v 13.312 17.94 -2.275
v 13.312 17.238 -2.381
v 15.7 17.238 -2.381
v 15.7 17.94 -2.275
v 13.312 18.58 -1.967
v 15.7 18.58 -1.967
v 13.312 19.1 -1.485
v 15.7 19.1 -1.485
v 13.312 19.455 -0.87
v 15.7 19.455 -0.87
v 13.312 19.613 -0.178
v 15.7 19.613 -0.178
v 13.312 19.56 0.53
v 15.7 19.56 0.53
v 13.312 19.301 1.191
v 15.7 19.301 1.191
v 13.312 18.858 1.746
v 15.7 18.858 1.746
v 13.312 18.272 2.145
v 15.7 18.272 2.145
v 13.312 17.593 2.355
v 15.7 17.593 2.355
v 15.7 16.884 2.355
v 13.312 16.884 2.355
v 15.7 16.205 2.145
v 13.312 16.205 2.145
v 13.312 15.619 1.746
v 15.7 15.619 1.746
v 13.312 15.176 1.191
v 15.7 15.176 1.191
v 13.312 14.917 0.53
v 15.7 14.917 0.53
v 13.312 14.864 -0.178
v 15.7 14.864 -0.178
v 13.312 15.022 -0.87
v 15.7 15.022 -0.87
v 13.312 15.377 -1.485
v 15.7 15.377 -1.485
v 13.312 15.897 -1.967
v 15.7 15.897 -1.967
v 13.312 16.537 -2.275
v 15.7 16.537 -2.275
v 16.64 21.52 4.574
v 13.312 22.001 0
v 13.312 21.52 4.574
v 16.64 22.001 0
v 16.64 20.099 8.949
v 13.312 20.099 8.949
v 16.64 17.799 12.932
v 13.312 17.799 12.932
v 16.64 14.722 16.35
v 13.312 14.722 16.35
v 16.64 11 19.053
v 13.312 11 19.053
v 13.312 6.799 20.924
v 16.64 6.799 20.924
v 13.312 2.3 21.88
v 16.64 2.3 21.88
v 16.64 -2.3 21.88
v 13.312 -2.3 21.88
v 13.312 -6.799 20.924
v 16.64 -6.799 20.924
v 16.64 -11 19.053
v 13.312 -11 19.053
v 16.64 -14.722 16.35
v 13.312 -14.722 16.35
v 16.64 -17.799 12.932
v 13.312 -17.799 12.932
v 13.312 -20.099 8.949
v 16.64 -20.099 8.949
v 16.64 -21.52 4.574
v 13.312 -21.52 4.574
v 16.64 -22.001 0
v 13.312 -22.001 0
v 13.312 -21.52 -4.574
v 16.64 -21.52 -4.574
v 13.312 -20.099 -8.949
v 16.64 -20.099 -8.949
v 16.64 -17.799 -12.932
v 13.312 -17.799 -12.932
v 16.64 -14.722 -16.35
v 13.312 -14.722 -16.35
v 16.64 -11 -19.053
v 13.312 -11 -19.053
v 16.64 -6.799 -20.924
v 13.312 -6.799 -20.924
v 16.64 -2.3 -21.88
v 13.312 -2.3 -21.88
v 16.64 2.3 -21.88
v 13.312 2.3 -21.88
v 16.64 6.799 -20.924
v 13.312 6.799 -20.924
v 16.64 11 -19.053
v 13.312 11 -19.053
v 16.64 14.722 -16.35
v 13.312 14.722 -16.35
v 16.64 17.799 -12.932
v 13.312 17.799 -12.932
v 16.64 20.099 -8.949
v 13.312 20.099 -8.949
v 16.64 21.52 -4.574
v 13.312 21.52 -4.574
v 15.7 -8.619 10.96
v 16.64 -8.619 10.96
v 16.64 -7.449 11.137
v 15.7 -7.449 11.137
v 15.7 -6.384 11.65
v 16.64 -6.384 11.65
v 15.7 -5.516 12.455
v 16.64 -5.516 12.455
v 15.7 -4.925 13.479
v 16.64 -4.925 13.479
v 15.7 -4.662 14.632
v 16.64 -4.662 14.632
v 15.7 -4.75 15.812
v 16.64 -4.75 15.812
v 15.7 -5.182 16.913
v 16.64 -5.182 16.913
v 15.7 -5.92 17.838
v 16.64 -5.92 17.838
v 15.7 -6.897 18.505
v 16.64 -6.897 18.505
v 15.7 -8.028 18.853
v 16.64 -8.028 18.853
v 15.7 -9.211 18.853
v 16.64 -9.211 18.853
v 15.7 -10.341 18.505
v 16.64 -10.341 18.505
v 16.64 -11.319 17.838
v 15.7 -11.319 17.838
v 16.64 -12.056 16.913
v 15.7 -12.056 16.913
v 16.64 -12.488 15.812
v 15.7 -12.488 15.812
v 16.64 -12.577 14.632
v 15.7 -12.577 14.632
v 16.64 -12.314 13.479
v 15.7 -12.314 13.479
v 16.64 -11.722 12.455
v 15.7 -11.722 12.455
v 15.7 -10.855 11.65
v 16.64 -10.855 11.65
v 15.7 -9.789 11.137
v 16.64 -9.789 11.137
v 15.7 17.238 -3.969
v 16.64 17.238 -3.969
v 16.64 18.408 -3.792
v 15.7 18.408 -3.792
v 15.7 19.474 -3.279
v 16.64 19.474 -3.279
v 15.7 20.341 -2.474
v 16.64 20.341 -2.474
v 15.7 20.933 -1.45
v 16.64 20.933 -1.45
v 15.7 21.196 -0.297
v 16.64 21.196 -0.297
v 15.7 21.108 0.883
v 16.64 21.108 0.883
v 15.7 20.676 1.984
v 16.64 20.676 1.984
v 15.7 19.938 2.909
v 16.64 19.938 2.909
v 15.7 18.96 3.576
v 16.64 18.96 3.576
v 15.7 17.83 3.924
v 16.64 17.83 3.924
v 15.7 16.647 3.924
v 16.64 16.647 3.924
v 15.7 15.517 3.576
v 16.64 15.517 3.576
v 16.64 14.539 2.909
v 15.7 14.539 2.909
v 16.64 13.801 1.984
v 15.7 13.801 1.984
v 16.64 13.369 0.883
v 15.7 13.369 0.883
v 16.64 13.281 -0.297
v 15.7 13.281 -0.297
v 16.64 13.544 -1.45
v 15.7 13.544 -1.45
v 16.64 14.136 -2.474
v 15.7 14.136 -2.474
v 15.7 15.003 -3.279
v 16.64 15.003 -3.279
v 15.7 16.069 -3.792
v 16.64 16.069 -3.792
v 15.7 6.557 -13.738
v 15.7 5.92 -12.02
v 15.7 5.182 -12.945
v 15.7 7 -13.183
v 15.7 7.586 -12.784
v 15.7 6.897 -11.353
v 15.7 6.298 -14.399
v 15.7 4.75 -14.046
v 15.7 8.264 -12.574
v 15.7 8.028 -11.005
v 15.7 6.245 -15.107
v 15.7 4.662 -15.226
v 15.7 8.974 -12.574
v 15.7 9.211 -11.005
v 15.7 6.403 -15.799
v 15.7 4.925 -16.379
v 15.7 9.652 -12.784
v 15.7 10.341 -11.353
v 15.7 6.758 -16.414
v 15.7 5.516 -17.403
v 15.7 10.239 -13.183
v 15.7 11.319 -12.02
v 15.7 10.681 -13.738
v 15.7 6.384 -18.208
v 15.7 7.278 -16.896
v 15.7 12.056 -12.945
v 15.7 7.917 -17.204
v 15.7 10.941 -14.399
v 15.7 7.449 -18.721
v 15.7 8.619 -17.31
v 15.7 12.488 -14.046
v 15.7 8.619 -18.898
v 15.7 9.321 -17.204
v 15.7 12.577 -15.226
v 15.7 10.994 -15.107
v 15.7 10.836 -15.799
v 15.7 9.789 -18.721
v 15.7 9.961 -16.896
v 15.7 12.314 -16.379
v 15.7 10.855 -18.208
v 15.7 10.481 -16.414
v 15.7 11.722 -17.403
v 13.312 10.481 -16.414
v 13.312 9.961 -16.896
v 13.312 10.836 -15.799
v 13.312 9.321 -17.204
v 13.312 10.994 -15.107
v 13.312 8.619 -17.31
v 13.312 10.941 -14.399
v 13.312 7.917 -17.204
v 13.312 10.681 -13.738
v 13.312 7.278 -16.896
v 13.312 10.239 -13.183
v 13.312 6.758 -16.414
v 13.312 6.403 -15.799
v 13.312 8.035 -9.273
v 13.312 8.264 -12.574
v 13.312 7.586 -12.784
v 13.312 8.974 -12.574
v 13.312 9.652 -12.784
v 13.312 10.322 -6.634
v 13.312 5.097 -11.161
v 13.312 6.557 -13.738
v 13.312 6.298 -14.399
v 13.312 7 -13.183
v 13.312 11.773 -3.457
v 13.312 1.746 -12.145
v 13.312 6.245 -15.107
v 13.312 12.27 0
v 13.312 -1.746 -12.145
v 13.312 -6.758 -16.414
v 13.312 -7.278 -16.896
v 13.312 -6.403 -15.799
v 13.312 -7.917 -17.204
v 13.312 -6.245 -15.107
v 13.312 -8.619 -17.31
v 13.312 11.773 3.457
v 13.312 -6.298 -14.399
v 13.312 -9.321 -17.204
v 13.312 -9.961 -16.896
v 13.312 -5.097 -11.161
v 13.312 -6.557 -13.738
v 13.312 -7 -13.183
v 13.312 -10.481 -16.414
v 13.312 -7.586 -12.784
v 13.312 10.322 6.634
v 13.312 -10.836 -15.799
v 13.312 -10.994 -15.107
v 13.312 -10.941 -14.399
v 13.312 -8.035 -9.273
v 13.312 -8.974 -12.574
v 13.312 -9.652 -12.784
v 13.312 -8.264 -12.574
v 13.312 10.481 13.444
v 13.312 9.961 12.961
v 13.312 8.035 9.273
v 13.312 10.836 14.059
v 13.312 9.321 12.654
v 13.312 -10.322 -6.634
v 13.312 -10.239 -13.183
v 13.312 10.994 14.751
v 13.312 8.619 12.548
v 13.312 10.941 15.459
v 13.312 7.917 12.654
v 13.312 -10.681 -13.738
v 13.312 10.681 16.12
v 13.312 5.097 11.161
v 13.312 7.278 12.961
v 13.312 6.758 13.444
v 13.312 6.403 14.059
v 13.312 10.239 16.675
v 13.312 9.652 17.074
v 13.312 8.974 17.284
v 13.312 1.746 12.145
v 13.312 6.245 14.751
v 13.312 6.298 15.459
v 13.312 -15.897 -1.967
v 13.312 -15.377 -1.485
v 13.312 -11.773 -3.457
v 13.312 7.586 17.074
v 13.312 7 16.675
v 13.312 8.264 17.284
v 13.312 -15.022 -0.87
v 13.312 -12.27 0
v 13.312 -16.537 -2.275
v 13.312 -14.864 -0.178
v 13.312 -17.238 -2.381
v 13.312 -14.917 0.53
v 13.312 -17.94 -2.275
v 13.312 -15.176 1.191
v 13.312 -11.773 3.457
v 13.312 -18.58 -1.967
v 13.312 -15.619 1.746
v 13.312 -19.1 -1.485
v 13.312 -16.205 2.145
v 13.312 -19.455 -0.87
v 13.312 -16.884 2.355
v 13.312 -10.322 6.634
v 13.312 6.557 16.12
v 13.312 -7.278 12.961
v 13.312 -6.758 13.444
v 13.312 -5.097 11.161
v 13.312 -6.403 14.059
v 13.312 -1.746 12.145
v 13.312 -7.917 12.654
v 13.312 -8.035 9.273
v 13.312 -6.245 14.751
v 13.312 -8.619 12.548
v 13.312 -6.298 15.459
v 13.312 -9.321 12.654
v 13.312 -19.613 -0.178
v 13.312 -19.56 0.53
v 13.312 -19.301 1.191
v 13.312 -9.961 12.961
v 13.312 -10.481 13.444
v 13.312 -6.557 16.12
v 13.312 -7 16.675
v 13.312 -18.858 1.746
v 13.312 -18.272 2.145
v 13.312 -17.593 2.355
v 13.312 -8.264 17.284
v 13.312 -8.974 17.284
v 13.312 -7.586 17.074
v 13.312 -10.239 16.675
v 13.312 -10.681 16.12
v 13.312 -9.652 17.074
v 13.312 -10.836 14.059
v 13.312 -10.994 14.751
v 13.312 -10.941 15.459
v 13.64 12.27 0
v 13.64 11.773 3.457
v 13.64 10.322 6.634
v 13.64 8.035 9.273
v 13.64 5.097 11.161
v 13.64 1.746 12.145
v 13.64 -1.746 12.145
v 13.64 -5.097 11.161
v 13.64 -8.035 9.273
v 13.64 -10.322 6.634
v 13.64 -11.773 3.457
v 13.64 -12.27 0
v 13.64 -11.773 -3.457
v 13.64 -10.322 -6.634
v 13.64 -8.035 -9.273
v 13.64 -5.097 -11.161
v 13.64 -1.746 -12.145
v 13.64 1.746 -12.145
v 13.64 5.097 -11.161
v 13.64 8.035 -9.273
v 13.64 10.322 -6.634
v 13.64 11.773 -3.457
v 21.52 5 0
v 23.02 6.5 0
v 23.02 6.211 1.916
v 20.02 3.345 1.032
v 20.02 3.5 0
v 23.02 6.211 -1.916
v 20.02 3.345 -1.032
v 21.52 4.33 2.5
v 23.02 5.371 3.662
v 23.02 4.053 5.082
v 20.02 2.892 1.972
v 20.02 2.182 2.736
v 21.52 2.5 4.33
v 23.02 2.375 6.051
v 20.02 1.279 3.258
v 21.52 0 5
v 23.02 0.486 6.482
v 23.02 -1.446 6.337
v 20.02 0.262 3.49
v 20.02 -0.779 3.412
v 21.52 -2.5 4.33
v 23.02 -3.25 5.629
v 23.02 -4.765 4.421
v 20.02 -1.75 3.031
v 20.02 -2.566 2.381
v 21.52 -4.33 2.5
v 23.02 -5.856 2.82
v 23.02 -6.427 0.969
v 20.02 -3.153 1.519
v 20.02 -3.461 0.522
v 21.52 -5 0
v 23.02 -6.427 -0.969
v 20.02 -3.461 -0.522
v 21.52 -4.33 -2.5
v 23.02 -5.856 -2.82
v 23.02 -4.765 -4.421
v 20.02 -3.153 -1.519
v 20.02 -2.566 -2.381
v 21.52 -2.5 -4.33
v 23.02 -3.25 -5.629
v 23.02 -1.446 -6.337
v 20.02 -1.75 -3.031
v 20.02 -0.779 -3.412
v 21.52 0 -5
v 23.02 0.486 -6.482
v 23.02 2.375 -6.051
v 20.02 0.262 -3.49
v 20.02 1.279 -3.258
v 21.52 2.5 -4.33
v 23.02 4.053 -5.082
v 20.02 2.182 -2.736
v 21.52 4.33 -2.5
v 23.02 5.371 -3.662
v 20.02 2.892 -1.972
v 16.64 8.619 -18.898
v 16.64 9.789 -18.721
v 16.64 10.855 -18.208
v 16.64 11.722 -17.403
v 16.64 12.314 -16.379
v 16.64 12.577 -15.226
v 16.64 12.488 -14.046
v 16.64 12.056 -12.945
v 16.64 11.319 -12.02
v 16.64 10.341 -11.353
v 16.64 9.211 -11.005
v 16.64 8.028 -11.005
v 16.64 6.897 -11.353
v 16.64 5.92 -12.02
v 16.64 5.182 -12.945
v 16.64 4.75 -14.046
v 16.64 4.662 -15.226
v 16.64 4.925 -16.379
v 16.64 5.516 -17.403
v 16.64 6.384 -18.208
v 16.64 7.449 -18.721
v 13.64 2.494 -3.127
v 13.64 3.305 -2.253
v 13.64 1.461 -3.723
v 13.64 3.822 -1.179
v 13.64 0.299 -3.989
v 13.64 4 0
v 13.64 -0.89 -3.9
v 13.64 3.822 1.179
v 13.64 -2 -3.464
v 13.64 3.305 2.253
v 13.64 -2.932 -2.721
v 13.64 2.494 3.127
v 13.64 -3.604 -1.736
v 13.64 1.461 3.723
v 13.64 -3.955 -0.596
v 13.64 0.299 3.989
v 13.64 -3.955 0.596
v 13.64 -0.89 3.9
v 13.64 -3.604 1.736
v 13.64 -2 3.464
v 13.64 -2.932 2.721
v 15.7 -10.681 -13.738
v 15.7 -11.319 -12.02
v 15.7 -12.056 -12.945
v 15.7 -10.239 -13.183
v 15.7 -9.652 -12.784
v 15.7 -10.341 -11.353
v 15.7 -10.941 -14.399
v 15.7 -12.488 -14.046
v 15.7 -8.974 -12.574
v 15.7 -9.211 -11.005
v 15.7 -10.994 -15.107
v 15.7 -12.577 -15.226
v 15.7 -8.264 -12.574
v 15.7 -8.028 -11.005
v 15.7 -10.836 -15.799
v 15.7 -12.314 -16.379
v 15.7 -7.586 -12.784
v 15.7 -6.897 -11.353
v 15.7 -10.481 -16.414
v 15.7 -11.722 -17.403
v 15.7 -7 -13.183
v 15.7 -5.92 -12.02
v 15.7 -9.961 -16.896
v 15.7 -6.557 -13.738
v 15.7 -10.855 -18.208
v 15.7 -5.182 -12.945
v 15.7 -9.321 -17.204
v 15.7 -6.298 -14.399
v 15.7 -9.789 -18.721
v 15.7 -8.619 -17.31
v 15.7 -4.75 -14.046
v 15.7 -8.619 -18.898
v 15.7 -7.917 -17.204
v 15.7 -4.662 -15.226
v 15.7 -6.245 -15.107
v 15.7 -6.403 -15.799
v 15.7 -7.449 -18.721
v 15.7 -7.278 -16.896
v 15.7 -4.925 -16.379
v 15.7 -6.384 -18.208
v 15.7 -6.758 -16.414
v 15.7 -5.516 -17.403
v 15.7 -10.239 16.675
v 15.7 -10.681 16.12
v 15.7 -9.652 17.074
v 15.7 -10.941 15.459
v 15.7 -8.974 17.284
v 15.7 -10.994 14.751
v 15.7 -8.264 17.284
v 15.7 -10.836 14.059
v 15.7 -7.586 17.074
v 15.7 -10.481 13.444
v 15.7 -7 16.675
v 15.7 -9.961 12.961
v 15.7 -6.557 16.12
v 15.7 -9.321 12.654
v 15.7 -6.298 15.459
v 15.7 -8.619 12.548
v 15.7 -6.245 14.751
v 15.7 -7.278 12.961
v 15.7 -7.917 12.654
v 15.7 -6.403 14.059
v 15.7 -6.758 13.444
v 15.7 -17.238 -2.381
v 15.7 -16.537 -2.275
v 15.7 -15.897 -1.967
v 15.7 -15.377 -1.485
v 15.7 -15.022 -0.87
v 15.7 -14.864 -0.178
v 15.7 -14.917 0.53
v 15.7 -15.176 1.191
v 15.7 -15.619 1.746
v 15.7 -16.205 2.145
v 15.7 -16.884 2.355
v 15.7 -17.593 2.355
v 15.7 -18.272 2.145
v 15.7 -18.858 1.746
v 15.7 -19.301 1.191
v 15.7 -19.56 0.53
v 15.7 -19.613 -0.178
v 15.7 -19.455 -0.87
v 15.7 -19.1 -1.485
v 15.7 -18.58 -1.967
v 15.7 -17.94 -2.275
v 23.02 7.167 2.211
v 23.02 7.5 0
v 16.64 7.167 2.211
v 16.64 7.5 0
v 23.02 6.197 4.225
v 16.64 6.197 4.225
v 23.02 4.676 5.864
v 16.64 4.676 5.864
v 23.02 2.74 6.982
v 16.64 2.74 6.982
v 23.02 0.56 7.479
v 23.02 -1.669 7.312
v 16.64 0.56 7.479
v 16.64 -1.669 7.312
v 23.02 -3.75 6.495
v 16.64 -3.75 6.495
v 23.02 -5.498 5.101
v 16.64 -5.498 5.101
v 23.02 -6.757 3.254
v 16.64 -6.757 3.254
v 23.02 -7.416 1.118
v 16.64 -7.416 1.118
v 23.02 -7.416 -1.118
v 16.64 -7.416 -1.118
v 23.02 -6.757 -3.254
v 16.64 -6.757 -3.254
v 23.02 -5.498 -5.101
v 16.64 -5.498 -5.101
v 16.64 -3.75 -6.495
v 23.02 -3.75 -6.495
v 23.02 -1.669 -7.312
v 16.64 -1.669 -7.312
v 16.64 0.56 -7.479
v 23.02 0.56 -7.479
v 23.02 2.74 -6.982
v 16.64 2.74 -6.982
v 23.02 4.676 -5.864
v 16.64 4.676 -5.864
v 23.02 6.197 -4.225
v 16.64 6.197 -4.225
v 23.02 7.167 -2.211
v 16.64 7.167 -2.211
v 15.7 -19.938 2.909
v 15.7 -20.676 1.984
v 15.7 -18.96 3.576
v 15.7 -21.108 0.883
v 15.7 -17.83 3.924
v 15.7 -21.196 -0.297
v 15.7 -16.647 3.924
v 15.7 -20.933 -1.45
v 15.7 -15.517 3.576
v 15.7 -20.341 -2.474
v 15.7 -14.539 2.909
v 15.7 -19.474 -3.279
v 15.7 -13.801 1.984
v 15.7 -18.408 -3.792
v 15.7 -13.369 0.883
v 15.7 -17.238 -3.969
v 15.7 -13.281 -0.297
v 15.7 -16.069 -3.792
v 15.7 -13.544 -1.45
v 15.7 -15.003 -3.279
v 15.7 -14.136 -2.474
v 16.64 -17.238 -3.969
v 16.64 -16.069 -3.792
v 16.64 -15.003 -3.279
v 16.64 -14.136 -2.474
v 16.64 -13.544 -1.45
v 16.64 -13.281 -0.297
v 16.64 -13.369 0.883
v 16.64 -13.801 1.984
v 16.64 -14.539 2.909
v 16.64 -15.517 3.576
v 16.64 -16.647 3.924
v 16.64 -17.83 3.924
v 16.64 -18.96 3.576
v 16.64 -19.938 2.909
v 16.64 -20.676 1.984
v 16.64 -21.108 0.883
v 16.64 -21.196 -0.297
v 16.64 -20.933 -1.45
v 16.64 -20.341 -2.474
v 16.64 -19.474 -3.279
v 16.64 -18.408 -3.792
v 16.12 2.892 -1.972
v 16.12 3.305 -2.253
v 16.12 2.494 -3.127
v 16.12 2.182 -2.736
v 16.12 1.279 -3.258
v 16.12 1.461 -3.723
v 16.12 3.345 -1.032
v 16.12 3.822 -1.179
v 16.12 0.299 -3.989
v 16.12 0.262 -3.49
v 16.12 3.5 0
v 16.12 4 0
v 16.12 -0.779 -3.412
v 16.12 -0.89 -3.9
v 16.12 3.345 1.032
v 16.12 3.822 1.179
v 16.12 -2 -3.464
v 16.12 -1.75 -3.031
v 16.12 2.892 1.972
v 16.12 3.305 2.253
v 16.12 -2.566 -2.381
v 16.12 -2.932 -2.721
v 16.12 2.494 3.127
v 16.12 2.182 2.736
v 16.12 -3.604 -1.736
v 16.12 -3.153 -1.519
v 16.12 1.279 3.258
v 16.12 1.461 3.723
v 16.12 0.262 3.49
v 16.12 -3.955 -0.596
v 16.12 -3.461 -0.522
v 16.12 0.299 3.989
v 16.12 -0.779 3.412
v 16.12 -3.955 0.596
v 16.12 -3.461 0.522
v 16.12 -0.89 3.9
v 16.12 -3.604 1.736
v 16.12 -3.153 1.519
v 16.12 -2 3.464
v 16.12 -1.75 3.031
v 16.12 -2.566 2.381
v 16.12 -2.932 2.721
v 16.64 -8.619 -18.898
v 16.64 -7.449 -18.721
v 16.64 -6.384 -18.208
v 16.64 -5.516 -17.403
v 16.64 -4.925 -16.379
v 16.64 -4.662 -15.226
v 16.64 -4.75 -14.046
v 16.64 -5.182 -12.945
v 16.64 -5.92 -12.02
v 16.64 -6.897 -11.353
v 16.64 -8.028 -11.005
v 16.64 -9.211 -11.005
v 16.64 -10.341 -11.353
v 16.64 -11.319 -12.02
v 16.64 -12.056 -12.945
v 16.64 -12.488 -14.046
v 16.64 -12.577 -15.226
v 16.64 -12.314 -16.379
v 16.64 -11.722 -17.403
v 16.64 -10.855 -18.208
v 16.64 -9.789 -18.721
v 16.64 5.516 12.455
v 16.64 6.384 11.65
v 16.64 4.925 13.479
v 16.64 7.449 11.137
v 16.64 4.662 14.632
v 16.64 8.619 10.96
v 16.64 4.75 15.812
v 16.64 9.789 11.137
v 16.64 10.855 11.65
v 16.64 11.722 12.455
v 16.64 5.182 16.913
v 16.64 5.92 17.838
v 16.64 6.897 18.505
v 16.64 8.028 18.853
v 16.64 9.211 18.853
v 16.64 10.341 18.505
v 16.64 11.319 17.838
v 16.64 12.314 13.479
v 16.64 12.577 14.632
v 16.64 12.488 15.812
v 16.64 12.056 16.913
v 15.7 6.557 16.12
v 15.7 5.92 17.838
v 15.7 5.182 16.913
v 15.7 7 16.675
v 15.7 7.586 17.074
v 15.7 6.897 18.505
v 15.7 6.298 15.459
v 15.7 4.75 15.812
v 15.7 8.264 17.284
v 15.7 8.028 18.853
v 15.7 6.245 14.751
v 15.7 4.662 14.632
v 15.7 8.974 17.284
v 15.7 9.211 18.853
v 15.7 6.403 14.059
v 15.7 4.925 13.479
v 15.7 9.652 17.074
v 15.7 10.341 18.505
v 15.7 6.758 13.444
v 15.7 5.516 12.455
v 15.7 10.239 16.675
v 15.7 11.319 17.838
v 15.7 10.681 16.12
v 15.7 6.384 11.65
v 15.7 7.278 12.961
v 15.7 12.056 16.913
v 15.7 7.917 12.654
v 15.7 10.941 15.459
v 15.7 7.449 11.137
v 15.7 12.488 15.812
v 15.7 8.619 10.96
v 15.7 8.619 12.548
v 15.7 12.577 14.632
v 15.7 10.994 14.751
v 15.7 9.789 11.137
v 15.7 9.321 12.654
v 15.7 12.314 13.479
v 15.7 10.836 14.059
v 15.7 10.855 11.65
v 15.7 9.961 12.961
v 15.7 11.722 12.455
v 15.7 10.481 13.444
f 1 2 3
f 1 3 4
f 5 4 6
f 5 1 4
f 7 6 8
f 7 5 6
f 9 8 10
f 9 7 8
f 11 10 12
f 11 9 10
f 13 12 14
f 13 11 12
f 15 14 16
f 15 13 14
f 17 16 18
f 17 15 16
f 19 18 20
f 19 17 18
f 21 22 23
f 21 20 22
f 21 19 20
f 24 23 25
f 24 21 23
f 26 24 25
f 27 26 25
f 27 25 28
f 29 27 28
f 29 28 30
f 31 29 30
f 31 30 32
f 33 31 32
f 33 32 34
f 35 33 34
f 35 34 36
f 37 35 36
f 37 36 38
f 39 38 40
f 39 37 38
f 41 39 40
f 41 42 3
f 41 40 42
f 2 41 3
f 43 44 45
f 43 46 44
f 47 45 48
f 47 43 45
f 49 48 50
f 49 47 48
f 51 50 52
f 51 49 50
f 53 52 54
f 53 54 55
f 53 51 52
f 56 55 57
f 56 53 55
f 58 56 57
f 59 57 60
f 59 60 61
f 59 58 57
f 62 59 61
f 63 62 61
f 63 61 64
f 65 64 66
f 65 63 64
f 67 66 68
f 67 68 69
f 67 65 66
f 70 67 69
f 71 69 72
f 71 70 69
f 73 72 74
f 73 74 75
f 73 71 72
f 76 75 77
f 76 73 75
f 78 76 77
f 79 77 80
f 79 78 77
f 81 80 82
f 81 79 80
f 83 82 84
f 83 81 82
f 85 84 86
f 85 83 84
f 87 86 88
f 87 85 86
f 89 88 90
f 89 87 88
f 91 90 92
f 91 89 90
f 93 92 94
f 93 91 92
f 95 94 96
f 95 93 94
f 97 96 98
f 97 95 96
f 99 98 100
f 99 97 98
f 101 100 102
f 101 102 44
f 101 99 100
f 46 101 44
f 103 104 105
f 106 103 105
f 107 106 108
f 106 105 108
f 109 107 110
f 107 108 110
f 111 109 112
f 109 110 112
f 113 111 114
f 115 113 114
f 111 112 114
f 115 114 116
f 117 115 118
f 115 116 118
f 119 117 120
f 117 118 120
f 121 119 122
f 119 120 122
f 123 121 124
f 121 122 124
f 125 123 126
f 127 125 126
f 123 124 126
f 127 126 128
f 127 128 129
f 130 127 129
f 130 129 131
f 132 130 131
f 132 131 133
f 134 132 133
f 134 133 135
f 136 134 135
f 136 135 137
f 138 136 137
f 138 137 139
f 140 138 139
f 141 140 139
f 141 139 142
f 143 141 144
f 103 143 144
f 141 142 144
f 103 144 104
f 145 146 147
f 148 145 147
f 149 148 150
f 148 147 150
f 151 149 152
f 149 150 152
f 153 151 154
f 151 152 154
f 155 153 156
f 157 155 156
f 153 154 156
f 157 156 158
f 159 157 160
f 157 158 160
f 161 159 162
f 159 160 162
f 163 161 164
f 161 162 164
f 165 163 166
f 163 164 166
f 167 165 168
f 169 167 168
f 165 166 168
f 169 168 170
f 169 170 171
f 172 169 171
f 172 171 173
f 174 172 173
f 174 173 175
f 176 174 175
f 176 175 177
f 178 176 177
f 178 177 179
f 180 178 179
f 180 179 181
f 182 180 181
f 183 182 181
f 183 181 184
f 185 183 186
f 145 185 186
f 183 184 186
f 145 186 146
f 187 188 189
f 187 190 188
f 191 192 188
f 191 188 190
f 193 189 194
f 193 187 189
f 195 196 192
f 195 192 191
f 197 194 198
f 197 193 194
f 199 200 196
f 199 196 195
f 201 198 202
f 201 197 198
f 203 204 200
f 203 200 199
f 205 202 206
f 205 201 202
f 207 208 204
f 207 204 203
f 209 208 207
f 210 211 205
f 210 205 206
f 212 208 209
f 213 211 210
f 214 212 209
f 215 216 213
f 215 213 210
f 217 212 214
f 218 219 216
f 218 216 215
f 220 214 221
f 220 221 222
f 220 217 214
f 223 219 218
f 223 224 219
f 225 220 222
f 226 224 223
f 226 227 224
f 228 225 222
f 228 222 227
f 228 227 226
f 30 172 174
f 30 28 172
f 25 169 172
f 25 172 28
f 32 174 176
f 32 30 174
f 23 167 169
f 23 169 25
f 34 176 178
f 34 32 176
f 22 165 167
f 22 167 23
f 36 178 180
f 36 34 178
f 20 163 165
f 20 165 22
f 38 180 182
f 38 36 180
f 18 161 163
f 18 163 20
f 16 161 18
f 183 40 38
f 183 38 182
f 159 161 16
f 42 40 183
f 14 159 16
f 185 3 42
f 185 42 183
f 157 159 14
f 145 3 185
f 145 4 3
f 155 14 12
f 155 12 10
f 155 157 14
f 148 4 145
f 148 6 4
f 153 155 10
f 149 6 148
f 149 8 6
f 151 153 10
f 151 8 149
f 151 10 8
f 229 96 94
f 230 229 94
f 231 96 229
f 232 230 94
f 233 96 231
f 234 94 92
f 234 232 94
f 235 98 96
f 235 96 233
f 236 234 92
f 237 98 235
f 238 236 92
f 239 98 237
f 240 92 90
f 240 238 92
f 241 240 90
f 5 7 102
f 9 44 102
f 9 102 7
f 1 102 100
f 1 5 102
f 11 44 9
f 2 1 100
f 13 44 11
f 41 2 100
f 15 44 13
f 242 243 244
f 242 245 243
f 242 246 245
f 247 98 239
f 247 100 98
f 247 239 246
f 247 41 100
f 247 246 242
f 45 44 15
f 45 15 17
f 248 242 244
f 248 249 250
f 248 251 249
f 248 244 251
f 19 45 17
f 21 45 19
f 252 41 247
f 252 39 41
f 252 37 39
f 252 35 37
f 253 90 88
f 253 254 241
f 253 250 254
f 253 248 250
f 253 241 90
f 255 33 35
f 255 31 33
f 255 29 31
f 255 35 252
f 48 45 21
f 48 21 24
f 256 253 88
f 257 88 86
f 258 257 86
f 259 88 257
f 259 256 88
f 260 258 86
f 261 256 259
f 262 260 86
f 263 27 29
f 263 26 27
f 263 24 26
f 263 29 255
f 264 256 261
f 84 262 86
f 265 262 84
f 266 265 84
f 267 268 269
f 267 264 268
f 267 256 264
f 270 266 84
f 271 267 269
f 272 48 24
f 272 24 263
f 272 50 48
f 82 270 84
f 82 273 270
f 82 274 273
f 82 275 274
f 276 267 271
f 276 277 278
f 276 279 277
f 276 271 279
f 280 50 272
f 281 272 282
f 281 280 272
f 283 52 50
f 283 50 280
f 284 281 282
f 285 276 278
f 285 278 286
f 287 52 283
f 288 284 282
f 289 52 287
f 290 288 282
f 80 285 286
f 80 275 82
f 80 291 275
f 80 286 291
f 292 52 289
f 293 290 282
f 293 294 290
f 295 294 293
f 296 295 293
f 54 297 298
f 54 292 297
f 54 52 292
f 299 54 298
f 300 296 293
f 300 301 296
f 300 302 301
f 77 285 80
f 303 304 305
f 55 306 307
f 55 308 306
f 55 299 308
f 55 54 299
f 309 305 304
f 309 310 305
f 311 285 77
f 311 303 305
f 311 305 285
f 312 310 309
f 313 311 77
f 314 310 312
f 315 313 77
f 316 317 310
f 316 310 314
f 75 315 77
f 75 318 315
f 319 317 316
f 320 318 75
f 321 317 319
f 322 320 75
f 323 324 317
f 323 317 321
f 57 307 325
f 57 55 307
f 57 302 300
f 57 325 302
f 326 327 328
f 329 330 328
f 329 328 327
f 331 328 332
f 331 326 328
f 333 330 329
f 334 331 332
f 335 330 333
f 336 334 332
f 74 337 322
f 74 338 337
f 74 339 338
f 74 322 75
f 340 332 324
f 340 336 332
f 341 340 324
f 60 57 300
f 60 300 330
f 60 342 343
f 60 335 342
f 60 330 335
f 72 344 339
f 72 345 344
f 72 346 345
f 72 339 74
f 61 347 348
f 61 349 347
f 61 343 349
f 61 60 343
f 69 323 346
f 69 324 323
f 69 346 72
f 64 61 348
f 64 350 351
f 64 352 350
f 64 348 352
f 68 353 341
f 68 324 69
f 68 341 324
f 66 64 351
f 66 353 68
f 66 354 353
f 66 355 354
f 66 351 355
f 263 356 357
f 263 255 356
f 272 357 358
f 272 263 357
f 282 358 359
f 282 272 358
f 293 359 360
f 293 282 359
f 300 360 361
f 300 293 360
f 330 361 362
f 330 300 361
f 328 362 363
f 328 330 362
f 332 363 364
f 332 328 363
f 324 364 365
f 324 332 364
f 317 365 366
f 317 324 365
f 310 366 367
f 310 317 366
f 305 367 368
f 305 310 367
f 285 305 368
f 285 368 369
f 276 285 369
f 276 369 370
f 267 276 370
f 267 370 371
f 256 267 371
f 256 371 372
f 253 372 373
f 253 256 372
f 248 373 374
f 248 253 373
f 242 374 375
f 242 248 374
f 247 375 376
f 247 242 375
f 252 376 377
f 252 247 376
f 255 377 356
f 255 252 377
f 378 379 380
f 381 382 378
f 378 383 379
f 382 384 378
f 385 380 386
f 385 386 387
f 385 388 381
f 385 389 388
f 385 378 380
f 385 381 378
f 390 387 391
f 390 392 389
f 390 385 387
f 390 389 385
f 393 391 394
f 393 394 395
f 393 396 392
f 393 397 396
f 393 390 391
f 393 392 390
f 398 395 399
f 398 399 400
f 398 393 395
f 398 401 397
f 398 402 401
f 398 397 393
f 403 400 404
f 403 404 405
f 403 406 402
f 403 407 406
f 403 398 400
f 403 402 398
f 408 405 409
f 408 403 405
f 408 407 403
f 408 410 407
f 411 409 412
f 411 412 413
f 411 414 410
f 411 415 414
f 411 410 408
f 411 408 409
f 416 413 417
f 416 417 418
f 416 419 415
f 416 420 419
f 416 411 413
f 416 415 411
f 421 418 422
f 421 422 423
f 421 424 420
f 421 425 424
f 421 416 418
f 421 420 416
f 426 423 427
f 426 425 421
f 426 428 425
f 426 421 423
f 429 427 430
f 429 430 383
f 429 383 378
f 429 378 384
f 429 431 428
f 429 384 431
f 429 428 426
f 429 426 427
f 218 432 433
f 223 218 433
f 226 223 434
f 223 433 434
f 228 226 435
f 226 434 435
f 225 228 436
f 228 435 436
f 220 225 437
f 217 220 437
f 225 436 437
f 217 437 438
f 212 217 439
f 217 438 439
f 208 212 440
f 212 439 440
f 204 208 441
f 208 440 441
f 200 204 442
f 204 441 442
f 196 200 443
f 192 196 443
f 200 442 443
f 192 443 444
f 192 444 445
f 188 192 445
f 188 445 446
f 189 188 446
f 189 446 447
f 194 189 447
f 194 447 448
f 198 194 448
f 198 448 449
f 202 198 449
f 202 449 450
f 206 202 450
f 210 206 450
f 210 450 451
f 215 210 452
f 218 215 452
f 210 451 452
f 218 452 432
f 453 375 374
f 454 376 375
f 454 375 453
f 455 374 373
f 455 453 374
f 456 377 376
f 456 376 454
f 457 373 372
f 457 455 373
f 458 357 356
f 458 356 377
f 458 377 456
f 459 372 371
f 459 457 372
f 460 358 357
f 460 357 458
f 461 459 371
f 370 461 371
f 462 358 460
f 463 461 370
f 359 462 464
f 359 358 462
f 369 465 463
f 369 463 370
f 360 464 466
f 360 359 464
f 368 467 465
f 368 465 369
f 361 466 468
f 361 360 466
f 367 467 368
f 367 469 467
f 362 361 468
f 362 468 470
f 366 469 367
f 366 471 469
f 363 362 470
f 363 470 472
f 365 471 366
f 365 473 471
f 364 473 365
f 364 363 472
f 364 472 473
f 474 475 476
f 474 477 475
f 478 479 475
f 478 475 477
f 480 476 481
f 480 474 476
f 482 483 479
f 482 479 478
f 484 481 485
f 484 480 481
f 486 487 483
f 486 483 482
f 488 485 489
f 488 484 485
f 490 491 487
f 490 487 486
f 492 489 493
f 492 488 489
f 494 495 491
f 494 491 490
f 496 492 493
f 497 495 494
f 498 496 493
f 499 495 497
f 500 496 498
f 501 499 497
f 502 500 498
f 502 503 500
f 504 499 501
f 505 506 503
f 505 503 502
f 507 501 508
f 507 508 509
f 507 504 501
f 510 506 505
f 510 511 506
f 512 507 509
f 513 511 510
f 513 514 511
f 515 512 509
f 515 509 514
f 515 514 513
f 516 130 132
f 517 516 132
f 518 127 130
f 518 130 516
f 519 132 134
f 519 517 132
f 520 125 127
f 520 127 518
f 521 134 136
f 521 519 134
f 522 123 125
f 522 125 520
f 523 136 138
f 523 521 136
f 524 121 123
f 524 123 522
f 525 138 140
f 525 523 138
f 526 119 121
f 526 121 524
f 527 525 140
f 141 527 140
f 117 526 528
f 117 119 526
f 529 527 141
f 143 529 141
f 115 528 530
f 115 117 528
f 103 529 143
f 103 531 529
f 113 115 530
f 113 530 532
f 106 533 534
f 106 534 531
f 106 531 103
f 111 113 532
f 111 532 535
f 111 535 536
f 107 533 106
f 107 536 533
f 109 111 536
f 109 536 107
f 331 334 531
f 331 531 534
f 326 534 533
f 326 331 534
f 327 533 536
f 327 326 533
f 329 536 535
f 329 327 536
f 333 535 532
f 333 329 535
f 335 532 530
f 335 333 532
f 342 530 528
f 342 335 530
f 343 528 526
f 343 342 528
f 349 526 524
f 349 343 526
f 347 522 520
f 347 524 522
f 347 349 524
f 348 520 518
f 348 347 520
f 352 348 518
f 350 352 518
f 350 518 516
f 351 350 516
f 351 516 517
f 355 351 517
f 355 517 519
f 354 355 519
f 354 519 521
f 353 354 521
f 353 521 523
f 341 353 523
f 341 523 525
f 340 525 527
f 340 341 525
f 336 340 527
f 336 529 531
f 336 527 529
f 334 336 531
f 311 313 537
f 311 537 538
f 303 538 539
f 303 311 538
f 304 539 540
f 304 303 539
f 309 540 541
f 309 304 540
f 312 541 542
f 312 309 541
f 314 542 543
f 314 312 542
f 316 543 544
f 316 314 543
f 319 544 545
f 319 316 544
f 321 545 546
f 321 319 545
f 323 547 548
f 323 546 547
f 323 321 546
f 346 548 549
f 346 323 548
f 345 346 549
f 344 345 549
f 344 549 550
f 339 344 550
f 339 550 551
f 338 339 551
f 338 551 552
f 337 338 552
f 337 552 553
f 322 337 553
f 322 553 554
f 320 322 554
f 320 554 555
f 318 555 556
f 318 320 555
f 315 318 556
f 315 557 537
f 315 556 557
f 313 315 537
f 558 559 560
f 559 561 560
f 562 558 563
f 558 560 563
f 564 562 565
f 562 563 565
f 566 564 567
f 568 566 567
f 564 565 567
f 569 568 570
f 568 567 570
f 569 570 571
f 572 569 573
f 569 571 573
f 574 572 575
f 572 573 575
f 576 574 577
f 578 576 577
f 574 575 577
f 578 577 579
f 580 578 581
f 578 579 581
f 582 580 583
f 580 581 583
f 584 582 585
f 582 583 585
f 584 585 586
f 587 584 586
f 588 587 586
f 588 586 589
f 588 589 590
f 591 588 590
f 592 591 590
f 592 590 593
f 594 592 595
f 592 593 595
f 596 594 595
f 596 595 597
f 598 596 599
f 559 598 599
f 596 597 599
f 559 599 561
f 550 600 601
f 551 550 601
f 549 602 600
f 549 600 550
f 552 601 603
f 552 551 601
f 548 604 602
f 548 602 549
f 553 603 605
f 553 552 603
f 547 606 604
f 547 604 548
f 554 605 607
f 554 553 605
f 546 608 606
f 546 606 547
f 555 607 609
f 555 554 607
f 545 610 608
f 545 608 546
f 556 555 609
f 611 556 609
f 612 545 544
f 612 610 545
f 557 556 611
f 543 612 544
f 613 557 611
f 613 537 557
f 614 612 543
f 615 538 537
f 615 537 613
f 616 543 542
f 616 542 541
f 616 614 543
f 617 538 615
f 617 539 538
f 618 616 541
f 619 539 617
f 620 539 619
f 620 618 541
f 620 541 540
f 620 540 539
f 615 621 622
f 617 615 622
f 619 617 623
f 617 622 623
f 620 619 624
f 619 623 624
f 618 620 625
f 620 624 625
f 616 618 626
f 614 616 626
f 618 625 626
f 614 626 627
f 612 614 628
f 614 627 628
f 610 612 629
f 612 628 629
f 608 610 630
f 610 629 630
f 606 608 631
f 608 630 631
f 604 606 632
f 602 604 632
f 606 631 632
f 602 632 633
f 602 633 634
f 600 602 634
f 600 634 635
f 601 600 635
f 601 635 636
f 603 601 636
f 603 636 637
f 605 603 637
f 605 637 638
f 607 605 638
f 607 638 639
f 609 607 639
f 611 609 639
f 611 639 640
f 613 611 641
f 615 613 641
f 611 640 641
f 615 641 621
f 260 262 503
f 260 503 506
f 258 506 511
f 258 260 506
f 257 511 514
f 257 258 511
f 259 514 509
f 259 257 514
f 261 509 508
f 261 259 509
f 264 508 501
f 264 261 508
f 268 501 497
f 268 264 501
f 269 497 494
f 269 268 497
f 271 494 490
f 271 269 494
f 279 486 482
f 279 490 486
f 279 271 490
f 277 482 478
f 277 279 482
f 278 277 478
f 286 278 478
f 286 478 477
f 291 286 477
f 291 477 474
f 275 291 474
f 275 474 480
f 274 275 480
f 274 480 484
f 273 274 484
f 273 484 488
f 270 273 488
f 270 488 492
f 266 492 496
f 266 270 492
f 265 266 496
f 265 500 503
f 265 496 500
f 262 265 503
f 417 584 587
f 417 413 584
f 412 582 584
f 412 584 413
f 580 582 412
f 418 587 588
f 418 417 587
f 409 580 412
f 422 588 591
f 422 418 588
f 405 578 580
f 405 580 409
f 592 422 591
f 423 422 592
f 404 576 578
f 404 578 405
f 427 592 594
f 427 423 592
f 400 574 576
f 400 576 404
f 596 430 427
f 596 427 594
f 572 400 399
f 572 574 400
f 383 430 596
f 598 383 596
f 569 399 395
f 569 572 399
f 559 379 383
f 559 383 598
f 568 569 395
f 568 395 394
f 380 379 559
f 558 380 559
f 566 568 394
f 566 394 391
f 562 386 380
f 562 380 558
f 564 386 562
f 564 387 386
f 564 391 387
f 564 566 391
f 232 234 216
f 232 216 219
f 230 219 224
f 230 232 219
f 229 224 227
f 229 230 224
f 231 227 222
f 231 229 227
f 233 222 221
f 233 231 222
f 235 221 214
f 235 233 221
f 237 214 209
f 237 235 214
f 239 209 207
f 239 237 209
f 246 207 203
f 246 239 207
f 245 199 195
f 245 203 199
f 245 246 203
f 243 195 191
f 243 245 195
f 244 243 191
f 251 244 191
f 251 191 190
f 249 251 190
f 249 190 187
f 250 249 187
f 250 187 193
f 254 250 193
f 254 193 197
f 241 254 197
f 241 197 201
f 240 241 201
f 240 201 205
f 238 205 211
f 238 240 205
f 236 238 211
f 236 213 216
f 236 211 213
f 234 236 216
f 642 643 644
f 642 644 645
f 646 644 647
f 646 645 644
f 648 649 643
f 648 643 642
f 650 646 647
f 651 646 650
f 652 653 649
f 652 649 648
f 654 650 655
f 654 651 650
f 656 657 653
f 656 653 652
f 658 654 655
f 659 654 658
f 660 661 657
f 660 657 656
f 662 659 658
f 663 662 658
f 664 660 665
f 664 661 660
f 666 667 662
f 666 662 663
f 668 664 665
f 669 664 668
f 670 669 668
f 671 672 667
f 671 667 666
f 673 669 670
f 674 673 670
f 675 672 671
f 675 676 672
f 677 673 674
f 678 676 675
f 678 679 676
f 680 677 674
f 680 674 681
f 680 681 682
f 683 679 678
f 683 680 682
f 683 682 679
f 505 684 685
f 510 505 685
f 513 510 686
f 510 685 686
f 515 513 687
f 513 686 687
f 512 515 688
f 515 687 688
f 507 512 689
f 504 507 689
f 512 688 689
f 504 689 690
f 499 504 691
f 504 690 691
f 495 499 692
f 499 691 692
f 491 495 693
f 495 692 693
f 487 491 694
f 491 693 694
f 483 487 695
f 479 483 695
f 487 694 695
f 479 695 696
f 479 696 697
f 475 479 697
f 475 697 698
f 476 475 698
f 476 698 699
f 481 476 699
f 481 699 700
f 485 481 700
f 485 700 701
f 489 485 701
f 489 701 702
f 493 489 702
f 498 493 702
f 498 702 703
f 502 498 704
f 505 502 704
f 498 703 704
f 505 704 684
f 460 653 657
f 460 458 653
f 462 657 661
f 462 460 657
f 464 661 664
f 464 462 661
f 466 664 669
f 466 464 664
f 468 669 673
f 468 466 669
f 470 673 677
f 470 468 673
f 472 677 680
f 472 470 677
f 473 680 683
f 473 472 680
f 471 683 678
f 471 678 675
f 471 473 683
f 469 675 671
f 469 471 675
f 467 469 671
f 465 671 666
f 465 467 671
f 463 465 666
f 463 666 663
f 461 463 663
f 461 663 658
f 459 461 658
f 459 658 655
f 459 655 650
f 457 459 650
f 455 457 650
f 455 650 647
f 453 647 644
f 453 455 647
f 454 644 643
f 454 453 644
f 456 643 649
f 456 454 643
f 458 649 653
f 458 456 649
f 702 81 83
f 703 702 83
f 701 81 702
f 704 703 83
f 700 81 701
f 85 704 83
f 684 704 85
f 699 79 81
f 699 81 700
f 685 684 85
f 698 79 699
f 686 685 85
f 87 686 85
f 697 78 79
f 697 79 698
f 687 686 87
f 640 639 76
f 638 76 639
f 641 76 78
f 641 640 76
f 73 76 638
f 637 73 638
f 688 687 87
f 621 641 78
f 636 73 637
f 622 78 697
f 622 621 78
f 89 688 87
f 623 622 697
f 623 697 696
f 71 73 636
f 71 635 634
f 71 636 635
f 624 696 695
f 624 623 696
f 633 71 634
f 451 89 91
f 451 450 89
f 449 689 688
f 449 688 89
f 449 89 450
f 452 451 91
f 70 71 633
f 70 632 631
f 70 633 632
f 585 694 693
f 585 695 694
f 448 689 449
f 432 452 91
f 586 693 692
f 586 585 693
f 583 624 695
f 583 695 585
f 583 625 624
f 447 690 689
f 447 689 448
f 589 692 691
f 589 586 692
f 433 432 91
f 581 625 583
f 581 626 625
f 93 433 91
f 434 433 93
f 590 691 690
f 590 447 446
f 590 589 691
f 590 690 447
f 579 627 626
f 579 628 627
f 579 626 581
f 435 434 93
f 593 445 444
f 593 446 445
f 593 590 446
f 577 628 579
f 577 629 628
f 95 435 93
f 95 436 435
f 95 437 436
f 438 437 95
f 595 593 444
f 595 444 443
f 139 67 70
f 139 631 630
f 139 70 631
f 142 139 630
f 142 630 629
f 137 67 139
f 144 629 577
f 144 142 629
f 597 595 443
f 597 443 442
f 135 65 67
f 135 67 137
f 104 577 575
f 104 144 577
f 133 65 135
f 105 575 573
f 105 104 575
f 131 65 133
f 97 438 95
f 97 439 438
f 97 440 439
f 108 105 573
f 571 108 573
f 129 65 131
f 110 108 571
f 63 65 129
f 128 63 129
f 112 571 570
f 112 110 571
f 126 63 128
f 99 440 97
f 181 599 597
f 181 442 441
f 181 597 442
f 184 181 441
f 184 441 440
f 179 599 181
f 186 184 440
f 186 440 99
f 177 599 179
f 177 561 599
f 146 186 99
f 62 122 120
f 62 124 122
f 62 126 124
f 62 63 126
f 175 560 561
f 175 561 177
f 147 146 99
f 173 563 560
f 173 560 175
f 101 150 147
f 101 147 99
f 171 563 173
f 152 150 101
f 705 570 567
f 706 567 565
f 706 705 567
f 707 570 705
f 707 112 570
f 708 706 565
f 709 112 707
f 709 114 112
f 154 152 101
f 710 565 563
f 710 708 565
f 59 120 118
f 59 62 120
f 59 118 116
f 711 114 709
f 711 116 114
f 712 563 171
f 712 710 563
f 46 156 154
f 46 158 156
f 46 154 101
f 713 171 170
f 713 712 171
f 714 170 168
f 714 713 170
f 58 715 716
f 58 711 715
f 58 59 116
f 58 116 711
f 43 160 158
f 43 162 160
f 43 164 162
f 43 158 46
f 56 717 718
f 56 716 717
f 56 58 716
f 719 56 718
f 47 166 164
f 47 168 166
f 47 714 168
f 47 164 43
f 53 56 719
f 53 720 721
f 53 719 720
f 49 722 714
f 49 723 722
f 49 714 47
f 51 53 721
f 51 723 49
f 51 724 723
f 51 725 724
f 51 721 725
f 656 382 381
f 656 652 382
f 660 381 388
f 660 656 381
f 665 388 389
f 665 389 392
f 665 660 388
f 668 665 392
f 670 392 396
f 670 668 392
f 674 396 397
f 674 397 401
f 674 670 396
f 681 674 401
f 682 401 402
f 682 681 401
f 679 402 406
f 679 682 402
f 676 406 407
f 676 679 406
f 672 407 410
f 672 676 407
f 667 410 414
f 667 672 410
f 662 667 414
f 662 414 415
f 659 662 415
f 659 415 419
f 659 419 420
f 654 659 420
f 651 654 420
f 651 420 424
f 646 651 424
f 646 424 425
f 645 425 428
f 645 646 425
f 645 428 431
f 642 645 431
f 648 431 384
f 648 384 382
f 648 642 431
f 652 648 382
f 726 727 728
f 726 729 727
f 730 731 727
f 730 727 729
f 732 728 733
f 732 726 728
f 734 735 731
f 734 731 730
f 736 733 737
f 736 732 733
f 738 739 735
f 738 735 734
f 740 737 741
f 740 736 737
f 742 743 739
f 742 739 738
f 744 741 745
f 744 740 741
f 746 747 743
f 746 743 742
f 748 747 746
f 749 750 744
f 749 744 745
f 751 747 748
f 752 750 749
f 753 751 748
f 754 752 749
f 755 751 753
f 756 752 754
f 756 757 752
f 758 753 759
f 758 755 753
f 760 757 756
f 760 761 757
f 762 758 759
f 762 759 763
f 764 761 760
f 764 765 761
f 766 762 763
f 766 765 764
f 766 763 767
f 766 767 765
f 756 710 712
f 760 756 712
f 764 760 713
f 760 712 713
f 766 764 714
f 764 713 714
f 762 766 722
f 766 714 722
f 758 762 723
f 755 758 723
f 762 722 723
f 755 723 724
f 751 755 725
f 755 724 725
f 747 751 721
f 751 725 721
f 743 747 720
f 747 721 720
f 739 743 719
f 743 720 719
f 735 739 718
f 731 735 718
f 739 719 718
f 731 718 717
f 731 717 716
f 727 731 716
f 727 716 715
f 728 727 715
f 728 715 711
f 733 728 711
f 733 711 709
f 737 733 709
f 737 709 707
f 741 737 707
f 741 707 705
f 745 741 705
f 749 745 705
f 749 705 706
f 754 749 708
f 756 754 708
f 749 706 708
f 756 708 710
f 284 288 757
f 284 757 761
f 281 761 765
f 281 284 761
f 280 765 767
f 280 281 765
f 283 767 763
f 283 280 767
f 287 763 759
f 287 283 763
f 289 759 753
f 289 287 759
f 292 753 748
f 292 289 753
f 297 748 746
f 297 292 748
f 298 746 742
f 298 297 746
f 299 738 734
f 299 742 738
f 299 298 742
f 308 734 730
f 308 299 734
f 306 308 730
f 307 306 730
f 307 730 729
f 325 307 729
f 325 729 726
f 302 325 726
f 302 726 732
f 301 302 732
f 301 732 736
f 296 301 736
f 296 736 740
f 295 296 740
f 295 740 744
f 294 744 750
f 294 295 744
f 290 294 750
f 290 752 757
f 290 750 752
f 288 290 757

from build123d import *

# Parameters (mm, degrees)
SKETCH5_R          = 2.38125
CUT_EXTRUDE1_DEPTH = 24.019799782
SKETCH6_R          = 3.96875
CUT_EXTRUDE2_DEPTH = 0.9398


with BuildPart() as part:
    # Sketch3 → Revolve1 (revolve)
    with BuildSketch(Plane.XY):
        Polygon((13.312399842, 22.00099994), (16.639799842, 22.00099994), (16.639799842, 7.499999986), (18.039799836, 7.499999986), (23.019799782, 7.499999986), (23.019799782, 6.499999954), (20.019799813, 3.499999985), (16.119799866, 3.499999985), (16.119799866, 4.000000001), (13.639799746, 4.000000001), (13.639799746, 12.269749908), (13.312399842, 12.269749908), align=None)
    revolve(axis=Axis((0, 0, 0), (1, 0, 0)))

    # Sketch5 → Cut-Extrude1 (cut, through all)
    with BuildSketch(Plane(origin=(0, 0, 0), x_dir=(0, 0, -1), z_dir=(1, 0, 0))):
        with Locations((-14.928978871, 8.61924997)):
            Circle(SKETCH5_R)
        with Locations((0, 17.23849994)):
            Circle(SKETCH5_R)
        with Locations((14.928978871, 8.61924997)):
            Circle(SKETCH5_R)
        with Locations((14.928978871, -8.61924997)):
            Circle(SKETCH5_R)
        with Locations((0, -17.23849994)):
            Circle(SKETCH5_R)
        with Locations((-14.928978871, -8.61924997)):
            Circle(SKETCH5_R)
    extrude(amount=CUT_EXTRUDE1_DEPTH, mode=Mode.SUBTRACT)

    # Sketch6 → Cut-Extrude2 (cut)
    with BuildSketch(Plane(origin=(16.639799842, 0, 0), x_dir=(0, 0, -1), z_dir=(1, 0, 0))):
        with Locations((0, 17.23849994)):
            Circle(SKETCH6_R)
        with Locations((14.928978871, 8.61924997)):
            Circle(SKETCH6_R)
        with Locations((14.928978871, -8.61924997)):
            Circle(SKETCH6_R)
        with Locations((0, -17.23849994)):
            Circle(SKETCH6_R)
        with Locations((-14.928978871, -8.61924997)):
            Circle(SKETCH6_R)
        with Locations((-14.928978871, 8.61924997)):
            Circle(SKETCH6_R)
    extrude(amount=-CUT_EXTRUDE2_DEPTH, mode=Mode.SUBTRACT)


solid = part.part
